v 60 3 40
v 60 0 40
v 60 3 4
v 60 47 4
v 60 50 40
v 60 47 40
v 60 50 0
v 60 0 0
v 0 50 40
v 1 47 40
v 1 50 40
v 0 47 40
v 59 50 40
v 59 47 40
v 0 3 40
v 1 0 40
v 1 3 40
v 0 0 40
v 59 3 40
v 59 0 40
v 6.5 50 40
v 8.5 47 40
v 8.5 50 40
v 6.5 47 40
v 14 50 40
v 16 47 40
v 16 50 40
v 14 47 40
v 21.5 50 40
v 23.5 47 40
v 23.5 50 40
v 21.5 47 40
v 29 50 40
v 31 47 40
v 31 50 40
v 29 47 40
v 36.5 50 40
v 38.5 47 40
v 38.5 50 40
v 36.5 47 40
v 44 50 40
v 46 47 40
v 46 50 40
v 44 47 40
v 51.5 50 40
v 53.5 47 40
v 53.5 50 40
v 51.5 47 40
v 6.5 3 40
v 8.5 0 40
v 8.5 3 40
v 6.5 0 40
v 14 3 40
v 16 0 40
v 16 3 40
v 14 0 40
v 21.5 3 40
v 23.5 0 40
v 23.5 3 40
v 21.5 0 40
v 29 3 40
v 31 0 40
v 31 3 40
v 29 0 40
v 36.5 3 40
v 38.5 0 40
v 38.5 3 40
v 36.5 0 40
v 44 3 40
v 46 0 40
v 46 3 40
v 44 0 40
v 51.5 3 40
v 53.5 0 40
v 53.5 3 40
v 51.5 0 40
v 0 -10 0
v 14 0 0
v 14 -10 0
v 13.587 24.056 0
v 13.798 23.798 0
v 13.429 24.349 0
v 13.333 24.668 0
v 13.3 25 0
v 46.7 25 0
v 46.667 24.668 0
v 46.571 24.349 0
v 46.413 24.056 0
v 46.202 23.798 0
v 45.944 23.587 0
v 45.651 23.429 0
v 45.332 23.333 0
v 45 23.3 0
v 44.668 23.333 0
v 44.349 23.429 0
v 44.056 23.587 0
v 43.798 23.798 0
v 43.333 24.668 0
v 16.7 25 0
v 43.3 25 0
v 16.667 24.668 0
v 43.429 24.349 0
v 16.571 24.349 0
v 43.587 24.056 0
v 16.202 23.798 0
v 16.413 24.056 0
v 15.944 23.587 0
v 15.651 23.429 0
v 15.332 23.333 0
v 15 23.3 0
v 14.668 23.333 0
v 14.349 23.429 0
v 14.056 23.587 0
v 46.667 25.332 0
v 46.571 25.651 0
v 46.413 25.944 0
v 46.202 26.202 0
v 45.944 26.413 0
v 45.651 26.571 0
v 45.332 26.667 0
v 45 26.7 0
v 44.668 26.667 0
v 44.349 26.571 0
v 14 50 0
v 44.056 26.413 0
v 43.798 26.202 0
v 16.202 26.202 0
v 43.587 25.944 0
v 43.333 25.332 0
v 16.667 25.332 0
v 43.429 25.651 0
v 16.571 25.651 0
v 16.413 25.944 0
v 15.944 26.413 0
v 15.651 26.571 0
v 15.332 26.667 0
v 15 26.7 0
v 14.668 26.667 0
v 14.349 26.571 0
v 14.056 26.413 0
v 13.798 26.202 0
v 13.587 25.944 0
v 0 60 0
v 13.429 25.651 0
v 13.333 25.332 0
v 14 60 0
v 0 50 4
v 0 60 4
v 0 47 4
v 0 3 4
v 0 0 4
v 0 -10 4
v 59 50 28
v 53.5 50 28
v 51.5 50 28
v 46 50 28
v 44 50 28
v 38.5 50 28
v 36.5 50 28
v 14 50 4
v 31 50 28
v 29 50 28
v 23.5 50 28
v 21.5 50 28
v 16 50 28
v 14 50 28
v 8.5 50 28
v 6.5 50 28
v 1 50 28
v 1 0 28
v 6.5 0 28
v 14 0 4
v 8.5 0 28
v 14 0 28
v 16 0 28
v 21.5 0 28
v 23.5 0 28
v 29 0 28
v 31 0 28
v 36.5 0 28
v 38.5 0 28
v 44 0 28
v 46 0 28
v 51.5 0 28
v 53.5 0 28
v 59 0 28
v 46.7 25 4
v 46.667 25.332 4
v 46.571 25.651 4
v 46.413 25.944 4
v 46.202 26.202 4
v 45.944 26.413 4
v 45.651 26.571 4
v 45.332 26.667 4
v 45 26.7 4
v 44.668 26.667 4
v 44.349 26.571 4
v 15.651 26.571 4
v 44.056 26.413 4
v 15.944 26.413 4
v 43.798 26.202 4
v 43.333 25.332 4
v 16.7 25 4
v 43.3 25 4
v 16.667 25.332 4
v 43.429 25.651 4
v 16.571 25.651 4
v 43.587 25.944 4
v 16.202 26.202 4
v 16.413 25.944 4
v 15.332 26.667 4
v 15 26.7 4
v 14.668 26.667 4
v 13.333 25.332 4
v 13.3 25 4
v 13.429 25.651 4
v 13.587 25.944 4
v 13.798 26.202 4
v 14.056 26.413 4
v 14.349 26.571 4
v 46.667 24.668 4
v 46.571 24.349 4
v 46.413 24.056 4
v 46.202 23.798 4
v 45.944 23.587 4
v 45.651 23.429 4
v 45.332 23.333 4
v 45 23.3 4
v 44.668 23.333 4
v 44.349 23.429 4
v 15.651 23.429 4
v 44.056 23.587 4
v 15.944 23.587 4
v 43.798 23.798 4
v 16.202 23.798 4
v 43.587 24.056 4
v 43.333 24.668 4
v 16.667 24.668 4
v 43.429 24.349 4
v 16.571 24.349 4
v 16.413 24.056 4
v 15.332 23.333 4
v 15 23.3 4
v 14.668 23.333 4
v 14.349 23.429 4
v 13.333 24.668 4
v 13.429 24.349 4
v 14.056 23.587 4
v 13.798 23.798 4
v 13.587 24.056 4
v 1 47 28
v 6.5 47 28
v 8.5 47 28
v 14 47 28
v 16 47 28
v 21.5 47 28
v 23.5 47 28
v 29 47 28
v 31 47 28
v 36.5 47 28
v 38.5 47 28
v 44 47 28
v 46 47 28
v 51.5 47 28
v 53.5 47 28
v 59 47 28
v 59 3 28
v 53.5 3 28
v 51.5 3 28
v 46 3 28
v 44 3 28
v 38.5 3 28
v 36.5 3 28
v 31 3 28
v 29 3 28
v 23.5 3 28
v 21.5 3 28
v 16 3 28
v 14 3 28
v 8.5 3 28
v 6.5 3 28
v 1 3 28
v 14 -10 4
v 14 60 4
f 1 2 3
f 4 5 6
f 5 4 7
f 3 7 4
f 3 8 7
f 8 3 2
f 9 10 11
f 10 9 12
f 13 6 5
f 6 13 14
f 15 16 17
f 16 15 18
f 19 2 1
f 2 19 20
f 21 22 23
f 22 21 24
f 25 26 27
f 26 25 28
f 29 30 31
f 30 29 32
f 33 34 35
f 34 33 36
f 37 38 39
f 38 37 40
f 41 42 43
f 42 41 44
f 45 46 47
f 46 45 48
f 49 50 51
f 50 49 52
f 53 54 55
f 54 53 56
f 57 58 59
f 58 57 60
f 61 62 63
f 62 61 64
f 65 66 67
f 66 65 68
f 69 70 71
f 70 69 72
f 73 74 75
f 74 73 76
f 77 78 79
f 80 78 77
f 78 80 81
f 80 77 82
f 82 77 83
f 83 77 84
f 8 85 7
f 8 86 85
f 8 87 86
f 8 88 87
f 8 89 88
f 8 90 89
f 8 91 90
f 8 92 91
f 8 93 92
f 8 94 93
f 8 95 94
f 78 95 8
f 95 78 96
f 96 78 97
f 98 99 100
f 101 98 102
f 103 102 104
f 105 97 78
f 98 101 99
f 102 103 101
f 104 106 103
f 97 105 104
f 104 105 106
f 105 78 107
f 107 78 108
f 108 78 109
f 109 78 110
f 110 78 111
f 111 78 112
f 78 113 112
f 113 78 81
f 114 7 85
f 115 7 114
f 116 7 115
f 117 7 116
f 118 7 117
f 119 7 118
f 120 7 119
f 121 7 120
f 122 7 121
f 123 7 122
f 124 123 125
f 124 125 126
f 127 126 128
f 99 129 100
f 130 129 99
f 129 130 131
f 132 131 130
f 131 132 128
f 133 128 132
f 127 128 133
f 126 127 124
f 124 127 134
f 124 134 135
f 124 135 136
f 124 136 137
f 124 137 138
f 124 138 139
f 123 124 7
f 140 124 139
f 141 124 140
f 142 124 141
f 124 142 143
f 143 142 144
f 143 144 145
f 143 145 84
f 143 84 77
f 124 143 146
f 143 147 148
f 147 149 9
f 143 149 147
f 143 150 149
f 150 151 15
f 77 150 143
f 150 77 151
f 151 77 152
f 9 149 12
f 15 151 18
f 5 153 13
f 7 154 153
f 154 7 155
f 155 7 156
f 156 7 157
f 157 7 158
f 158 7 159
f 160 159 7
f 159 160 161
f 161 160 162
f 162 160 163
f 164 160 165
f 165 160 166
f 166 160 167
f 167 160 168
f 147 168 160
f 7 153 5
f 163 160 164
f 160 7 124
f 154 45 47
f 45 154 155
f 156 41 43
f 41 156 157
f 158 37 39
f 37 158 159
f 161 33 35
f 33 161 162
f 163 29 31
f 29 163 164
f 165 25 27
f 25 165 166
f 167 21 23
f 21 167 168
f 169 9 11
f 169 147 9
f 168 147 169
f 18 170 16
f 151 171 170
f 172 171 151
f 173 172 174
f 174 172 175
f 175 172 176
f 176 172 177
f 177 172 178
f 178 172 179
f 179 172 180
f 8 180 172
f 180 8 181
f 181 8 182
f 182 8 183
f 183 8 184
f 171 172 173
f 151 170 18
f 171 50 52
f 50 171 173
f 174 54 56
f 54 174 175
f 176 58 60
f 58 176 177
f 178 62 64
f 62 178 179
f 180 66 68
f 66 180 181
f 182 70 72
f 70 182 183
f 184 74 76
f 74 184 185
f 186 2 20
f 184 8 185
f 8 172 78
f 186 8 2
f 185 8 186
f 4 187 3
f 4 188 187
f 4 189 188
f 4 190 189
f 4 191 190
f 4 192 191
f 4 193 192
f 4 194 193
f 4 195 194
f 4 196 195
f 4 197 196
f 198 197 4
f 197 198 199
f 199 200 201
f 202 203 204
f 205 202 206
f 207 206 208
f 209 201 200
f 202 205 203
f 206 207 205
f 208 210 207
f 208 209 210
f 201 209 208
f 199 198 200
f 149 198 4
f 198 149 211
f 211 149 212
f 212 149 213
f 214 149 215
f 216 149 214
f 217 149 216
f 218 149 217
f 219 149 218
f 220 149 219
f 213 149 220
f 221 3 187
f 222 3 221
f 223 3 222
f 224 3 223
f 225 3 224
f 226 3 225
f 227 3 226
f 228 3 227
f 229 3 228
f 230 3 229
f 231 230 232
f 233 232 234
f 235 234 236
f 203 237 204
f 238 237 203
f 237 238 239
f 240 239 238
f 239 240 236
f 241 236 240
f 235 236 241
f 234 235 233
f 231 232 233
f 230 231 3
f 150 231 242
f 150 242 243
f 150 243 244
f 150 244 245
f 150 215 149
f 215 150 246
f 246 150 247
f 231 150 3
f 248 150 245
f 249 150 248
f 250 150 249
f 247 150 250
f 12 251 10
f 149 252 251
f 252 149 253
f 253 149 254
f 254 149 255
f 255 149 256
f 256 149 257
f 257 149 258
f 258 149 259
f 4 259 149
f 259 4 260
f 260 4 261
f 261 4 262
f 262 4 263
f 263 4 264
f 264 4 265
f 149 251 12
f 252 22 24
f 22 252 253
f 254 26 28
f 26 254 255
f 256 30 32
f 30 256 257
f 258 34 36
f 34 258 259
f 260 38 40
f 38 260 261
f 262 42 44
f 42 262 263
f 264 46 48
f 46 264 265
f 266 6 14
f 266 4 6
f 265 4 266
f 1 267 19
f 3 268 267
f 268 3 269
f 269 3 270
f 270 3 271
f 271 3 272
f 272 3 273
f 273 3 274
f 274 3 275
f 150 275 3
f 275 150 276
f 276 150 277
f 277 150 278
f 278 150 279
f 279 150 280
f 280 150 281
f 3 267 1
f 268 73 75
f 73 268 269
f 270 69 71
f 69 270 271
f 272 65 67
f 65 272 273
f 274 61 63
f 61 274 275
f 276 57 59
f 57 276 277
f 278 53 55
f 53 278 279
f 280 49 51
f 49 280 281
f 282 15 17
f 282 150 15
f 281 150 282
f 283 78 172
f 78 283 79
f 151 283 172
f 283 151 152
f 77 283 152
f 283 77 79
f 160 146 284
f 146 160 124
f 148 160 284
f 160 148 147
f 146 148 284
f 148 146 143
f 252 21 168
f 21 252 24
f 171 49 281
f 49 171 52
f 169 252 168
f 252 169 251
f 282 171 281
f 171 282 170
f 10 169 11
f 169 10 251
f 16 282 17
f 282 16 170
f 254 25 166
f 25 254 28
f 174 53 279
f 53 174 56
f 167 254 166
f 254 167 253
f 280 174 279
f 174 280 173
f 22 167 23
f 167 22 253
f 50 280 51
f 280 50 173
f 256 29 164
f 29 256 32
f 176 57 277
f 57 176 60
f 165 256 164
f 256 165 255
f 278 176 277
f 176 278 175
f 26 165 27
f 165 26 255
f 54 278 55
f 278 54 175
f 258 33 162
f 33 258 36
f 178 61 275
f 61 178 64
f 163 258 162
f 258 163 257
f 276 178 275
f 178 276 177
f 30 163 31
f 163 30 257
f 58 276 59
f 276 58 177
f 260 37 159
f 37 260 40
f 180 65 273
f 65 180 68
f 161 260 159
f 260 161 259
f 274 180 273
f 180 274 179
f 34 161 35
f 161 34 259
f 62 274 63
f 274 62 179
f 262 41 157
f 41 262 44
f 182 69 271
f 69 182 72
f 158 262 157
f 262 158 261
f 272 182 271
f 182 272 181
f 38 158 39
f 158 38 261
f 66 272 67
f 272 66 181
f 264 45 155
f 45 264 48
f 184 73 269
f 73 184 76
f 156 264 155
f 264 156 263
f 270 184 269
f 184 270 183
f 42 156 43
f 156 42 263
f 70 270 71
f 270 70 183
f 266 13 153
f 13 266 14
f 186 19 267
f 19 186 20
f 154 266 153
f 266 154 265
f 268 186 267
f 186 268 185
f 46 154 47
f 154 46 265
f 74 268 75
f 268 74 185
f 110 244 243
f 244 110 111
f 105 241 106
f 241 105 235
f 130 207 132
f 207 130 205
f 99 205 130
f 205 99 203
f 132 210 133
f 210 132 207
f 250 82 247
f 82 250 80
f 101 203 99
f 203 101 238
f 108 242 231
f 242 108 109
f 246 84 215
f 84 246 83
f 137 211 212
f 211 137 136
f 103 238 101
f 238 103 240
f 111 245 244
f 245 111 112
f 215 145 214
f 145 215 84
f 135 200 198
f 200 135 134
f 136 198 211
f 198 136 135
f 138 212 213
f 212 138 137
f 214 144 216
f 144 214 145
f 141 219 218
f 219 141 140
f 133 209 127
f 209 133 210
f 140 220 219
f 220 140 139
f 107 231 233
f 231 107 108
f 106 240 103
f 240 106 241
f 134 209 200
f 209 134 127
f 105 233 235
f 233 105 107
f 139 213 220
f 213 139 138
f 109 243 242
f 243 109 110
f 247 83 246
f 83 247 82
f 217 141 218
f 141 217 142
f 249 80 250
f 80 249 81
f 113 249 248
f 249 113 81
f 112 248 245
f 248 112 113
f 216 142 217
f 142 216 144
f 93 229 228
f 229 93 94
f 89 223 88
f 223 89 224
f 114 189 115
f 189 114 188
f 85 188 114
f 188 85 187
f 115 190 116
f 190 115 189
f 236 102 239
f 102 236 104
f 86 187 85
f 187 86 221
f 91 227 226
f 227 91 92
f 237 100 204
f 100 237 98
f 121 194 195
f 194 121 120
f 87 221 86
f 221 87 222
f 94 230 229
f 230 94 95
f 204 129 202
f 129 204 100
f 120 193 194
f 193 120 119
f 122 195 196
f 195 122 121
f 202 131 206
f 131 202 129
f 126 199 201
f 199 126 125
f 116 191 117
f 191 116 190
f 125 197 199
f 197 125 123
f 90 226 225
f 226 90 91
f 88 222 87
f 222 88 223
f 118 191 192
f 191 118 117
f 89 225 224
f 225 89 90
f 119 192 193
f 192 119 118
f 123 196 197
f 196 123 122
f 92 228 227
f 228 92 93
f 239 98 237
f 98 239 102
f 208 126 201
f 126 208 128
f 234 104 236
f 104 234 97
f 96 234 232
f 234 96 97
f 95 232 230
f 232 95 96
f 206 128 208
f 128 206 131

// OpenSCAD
$fn = 32;
// ----------------------------------------------------------------------
// Cable duct: 60 x 50 x 40 mm, 8 fingers
// ----------------------------------------------------------------------

// --- parameters (mm) ---
channel_l = 60;           // duct length, X
channel_w = 50;           // duct width, Y
channel_h = 40;           // duct height, Z
channel_t = 3;            // side wall thickness
floor_t = 4;              // floor thickness
slot_w = 5.5;             // finger slot width
slot_h = 24;              // finger slot height
fingers = 8;              // number of finger slots per side
pitch = 7.5;              // finger pitch
hole_d = 3.4;             // floor mounting hole
hole_n = 2;               // mounting holes in the floor
ear_w = 11;               // mounting ear width
ear_l = 14;               // mounting ear length

module shell() {
  difference() {
    cube([channel_l, channel_w, channel_h]);
    /* open top channel */
    translate([-channel_t - 1, channel_t, floor_t])
      cube([channel_l + 2 * channel_t + 2, channel_w - 2 * channel_t, channel_h + 1]);
  }
}

module ears() {
  translate([0, -ear_w + 1, 0]) cube([ear_l, ear_w, floor_t]);
  translate([0, channel_w - 1, 0]) cube([ear_l, ear_w, floor_t]);
}

difference() {
  union() {
    shell();
    ears();
  }
  /* finger slots cut through both side walls */
  for (i = [0 : fingers - 1]) translate([pitch / 2 + i * pitch - slot_w / 2, -1, floor_t + slot_h]) cube([slot_w, channel_w + 2, channel_h]);
  for (i = [0 : hole_n - 1]) translate([(channel_l / hole_n) * (i + 0.5), channel_w / 2, -1]) cylinder(h = floor_t + 2, d = hole_d);
}
